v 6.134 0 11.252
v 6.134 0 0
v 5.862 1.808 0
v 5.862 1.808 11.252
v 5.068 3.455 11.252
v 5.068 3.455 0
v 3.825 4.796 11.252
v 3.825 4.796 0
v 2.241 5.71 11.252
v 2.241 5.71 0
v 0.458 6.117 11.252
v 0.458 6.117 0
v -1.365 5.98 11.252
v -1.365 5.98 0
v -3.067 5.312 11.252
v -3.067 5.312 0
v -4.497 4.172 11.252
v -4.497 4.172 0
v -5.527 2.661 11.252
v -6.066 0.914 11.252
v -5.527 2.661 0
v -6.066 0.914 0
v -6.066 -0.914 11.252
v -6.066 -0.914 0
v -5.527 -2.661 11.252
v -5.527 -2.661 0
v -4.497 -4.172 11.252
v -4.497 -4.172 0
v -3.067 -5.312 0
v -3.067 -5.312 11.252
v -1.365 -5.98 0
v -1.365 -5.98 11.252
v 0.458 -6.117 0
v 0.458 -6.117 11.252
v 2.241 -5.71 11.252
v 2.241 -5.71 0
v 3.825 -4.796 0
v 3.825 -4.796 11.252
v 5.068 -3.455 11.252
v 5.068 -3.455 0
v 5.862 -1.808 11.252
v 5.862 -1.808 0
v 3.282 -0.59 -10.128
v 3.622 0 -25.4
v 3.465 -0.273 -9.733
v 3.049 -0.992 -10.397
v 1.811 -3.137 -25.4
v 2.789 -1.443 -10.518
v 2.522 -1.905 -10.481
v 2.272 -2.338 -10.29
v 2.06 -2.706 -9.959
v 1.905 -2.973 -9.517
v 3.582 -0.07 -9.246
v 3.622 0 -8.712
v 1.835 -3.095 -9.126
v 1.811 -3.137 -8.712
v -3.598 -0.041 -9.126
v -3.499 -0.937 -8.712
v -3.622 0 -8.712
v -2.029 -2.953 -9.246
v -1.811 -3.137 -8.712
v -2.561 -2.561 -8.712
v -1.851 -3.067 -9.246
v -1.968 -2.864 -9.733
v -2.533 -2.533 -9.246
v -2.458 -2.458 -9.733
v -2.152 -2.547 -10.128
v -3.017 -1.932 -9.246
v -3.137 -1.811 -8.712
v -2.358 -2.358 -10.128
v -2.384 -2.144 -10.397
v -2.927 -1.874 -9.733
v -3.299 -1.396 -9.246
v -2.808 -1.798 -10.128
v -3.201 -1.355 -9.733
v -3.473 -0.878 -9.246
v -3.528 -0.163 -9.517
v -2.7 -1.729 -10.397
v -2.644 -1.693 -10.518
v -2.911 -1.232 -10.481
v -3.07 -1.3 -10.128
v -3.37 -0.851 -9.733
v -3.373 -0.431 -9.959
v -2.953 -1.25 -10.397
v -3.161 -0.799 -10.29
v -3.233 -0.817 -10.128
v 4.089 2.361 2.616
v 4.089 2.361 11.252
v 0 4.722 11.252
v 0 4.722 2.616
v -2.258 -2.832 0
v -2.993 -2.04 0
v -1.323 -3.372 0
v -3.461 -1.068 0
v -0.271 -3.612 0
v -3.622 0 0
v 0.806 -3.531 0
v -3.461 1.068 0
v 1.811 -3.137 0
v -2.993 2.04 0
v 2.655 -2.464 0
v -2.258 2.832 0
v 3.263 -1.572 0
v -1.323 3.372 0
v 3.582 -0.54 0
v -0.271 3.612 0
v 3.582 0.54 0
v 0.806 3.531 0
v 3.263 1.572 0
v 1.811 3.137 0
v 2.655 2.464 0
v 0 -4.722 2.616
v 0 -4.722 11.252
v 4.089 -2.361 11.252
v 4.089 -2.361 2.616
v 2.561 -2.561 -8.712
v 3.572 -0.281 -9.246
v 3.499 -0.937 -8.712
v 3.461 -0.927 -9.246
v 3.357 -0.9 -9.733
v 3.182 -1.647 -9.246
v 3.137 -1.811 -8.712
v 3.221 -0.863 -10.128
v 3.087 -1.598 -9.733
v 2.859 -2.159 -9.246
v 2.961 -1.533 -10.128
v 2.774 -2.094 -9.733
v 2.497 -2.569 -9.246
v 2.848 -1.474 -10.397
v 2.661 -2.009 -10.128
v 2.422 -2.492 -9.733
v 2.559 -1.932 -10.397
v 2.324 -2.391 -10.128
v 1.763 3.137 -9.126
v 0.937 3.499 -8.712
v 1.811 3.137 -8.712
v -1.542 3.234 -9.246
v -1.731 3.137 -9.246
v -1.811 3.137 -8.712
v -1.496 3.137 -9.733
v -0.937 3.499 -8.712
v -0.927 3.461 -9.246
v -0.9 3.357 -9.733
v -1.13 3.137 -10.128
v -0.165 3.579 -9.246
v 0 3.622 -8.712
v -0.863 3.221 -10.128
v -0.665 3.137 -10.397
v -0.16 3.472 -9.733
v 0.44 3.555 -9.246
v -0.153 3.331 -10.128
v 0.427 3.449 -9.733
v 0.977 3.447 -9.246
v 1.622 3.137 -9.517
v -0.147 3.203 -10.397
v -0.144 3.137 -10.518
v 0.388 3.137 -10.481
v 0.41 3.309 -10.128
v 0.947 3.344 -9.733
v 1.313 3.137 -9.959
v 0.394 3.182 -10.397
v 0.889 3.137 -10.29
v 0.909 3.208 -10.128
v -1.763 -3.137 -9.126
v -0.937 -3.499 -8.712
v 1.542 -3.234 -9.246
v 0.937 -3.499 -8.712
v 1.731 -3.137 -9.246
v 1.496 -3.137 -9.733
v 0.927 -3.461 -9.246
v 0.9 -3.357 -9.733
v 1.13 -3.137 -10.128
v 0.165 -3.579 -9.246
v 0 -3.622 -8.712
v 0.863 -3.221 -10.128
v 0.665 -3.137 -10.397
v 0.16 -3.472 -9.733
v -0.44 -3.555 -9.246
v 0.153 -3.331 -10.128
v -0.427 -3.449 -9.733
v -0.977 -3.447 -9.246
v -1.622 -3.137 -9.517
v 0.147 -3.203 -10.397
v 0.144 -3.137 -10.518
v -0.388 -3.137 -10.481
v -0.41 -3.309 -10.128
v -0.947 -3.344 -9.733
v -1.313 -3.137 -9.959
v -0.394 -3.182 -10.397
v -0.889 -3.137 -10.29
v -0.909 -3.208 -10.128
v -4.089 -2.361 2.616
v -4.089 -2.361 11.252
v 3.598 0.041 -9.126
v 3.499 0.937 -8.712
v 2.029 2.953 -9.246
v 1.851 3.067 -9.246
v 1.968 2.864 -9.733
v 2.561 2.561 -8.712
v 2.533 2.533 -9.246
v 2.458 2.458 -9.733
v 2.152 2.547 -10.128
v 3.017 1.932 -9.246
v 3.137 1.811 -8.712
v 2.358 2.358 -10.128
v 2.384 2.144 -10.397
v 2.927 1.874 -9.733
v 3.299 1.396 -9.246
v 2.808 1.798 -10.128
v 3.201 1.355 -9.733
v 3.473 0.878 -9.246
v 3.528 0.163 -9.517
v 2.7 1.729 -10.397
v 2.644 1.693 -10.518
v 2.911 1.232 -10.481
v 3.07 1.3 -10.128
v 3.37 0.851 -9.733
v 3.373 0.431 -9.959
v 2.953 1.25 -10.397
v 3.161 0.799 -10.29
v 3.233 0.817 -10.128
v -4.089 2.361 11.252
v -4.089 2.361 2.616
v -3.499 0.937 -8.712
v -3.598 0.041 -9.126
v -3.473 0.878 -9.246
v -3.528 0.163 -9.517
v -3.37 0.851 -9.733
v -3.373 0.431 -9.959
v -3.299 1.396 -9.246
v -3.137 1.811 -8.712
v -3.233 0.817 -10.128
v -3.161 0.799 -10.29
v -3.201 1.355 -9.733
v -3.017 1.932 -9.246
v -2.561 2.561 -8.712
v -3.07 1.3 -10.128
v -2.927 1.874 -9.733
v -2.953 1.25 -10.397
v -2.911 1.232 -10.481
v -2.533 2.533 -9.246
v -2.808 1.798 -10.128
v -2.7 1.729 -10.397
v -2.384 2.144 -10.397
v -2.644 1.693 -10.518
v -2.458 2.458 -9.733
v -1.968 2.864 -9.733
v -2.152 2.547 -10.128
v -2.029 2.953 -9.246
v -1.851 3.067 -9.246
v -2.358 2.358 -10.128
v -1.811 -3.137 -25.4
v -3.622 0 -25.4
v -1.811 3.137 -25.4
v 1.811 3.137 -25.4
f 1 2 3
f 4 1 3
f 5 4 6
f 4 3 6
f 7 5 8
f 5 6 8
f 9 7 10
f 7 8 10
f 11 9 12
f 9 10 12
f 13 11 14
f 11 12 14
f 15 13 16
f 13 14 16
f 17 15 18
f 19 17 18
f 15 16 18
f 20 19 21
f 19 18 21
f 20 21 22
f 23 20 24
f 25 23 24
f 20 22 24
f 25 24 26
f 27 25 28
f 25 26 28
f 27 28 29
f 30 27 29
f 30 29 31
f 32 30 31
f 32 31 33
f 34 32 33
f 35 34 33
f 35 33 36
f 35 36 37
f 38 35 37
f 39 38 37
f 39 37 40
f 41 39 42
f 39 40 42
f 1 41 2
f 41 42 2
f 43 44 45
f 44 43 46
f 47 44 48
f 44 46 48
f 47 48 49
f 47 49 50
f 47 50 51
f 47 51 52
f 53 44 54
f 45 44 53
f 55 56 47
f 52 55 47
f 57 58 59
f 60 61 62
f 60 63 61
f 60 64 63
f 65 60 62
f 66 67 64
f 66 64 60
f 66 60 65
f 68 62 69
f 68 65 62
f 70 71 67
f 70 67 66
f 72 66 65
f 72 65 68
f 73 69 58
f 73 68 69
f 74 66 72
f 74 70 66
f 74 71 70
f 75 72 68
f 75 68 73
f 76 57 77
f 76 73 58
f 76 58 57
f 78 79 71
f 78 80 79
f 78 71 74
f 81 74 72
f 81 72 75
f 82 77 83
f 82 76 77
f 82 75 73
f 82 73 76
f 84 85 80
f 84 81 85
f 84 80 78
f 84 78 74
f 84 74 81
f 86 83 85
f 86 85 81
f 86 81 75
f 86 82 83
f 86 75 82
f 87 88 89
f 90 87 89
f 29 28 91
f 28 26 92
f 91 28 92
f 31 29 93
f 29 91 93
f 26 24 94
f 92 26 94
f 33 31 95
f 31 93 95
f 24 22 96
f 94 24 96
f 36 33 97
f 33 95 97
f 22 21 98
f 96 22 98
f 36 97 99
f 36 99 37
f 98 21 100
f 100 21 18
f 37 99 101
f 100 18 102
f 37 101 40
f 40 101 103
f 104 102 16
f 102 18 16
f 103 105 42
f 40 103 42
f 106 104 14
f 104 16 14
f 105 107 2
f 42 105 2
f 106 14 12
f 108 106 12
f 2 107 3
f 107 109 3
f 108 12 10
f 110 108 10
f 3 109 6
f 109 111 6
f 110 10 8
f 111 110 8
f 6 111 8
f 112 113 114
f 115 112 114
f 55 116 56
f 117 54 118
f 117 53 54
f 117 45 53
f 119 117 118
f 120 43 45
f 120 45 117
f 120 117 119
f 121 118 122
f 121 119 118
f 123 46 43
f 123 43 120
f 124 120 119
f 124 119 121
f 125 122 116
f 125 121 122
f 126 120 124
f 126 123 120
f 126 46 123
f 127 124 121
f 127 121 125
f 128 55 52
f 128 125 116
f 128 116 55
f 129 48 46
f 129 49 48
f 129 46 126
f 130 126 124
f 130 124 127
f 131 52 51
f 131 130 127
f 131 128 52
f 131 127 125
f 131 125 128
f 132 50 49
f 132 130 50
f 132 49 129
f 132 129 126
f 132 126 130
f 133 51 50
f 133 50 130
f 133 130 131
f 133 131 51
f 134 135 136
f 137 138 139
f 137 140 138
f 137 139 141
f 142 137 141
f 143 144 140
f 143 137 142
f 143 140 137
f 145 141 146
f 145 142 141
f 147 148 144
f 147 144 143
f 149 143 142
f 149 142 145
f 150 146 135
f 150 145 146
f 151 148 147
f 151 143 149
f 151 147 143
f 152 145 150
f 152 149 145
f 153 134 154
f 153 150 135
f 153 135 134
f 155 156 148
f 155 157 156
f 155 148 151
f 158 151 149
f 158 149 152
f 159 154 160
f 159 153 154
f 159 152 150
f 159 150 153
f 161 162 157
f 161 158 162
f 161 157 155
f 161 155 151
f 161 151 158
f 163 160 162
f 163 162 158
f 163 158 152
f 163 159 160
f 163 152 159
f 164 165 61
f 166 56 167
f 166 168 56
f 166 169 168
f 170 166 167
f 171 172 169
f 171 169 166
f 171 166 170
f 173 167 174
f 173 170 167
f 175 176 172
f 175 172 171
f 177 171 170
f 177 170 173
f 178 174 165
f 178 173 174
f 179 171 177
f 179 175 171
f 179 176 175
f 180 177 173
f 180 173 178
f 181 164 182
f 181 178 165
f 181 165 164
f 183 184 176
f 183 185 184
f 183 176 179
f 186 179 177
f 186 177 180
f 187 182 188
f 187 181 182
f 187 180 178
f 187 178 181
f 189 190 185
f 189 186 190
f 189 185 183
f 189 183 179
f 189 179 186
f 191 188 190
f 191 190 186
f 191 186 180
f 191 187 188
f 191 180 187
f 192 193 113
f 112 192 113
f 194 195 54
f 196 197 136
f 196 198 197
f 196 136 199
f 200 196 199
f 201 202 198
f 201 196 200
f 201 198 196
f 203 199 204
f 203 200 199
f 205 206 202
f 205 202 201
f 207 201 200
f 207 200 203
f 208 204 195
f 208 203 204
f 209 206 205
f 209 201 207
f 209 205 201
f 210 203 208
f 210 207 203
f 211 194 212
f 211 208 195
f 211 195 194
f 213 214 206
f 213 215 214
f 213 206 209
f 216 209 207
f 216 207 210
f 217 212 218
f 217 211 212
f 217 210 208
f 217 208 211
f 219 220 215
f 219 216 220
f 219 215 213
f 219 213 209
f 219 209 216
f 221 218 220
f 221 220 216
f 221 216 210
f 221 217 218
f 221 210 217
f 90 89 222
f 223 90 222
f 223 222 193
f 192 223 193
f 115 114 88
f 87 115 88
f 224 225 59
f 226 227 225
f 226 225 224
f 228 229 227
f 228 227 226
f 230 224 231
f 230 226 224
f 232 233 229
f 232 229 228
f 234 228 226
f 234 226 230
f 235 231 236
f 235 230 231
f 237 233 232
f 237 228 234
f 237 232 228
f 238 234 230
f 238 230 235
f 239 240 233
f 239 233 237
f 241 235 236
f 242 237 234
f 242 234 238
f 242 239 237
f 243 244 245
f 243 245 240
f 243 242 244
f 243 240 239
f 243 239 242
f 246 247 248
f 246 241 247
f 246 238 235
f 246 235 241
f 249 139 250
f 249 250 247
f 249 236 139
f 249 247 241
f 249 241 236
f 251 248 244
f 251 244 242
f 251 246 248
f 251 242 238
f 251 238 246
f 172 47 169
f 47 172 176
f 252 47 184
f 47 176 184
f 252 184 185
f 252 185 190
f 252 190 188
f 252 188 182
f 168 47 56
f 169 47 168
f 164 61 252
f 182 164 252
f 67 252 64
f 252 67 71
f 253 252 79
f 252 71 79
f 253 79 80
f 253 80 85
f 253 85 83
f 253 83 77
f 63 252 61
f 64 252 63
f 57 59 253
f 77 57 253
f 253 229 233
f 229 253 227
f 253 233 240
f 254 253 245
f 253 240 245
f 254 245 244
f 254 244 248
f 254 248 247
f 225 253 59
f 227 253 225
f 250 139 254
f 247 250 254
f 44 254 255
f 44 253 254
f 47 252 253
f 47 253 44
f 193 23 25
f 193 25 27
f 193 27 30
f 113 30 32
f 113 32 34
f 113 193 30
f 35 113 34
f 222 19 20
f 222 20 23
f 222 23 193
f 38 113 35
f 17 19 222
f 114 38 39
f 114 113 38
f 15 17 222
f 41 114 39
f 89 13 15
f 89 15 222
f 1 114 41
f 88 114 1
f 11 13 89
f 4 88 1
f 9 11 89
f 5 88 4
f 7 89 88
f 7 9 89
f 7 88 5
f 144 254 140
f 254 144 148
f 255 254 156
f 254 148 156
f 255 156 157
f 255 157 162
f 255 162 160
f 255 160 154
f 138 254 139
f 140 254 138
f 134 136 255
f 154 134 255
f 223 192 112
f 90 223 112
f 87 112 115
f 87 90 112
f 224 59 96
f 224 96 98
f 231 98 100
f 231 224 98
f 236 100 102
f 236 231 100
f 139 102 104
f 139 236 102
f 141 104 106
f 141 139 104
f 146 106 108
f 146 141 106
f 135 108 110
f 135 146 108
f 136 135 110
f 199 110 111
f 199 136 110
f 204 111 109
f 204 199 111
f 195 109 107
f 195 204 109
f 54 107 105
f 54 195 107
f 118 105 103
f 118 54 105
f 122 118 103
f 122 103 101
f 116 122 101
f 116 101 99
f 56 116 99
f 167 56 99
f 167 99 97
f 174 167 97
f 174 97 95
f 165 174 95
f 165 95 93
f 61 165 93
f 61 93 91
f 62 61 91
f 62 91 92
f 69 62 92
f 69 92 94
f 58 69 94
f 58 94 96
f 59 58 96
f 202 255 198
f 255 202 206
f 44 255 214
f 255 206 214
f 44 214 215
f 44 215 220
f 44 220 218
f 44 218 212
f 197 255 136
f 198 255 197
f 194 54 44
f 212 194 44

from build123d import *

# Parameters (mm, degrees)
F0_R     = 6.1341
F1_DEPTH = 11.2522
F3_DEPTH = 8.636
F5_DEPTH = 25.4


with BuildPart() as f1:
    # F0 (on Top) → F1 (new body)
    with BuildSketch(Plane.XY):
        Circle(F0_R)
    extrude(amount=F1_DEPTH)

    # F2 (on face) → F3 (cut)
    with BuildSketch(Plane.XY.offset(11.2522)):
        Polygon((4.0894, -2.361016), (4.0894, 2.361016), (0, 4.722032), (-4.0894, 2.361016), (-4.0894, -2.361016), (0, -4.722032), align=None)
    extrude(amount=-F3_DEPTH, mode=Mode.SUBTRACT)

    # F4 (on face) → F5 (join)
    with BuildSketch(Plane(origin=(0, 0, 0), x_dir=(1, 0, 0), z_dir=(0, 0, -1))):
        Polygon((-1.81109, -3.1369), (1.81109, -3.1369), (3.62218, 0), (1.81109, 3.1369), (-1.81109, 3.1369), (-3.62218, 0), align=None)
    extrude(amount=F5_DEPTH)

    # F6 (on Front) → F7 (revolve)
    with BuildSketch(Plane.XZ):
        with BuildLine():
            Line((0, 0), (-3.62218, 0))
            Line((-3.62218, 0), (-3.62218, -8.7122))
            ThreePointArc((-3.62218, -8.7122), (-2.561268, -11.273468), (0, -12.33438))
            Line((0, -12.33438), (0, 0))
        make_face()
    revolve(axis=Axis((0, 0, -6.16719), (0, 0, -1)))


solid = f1.part
